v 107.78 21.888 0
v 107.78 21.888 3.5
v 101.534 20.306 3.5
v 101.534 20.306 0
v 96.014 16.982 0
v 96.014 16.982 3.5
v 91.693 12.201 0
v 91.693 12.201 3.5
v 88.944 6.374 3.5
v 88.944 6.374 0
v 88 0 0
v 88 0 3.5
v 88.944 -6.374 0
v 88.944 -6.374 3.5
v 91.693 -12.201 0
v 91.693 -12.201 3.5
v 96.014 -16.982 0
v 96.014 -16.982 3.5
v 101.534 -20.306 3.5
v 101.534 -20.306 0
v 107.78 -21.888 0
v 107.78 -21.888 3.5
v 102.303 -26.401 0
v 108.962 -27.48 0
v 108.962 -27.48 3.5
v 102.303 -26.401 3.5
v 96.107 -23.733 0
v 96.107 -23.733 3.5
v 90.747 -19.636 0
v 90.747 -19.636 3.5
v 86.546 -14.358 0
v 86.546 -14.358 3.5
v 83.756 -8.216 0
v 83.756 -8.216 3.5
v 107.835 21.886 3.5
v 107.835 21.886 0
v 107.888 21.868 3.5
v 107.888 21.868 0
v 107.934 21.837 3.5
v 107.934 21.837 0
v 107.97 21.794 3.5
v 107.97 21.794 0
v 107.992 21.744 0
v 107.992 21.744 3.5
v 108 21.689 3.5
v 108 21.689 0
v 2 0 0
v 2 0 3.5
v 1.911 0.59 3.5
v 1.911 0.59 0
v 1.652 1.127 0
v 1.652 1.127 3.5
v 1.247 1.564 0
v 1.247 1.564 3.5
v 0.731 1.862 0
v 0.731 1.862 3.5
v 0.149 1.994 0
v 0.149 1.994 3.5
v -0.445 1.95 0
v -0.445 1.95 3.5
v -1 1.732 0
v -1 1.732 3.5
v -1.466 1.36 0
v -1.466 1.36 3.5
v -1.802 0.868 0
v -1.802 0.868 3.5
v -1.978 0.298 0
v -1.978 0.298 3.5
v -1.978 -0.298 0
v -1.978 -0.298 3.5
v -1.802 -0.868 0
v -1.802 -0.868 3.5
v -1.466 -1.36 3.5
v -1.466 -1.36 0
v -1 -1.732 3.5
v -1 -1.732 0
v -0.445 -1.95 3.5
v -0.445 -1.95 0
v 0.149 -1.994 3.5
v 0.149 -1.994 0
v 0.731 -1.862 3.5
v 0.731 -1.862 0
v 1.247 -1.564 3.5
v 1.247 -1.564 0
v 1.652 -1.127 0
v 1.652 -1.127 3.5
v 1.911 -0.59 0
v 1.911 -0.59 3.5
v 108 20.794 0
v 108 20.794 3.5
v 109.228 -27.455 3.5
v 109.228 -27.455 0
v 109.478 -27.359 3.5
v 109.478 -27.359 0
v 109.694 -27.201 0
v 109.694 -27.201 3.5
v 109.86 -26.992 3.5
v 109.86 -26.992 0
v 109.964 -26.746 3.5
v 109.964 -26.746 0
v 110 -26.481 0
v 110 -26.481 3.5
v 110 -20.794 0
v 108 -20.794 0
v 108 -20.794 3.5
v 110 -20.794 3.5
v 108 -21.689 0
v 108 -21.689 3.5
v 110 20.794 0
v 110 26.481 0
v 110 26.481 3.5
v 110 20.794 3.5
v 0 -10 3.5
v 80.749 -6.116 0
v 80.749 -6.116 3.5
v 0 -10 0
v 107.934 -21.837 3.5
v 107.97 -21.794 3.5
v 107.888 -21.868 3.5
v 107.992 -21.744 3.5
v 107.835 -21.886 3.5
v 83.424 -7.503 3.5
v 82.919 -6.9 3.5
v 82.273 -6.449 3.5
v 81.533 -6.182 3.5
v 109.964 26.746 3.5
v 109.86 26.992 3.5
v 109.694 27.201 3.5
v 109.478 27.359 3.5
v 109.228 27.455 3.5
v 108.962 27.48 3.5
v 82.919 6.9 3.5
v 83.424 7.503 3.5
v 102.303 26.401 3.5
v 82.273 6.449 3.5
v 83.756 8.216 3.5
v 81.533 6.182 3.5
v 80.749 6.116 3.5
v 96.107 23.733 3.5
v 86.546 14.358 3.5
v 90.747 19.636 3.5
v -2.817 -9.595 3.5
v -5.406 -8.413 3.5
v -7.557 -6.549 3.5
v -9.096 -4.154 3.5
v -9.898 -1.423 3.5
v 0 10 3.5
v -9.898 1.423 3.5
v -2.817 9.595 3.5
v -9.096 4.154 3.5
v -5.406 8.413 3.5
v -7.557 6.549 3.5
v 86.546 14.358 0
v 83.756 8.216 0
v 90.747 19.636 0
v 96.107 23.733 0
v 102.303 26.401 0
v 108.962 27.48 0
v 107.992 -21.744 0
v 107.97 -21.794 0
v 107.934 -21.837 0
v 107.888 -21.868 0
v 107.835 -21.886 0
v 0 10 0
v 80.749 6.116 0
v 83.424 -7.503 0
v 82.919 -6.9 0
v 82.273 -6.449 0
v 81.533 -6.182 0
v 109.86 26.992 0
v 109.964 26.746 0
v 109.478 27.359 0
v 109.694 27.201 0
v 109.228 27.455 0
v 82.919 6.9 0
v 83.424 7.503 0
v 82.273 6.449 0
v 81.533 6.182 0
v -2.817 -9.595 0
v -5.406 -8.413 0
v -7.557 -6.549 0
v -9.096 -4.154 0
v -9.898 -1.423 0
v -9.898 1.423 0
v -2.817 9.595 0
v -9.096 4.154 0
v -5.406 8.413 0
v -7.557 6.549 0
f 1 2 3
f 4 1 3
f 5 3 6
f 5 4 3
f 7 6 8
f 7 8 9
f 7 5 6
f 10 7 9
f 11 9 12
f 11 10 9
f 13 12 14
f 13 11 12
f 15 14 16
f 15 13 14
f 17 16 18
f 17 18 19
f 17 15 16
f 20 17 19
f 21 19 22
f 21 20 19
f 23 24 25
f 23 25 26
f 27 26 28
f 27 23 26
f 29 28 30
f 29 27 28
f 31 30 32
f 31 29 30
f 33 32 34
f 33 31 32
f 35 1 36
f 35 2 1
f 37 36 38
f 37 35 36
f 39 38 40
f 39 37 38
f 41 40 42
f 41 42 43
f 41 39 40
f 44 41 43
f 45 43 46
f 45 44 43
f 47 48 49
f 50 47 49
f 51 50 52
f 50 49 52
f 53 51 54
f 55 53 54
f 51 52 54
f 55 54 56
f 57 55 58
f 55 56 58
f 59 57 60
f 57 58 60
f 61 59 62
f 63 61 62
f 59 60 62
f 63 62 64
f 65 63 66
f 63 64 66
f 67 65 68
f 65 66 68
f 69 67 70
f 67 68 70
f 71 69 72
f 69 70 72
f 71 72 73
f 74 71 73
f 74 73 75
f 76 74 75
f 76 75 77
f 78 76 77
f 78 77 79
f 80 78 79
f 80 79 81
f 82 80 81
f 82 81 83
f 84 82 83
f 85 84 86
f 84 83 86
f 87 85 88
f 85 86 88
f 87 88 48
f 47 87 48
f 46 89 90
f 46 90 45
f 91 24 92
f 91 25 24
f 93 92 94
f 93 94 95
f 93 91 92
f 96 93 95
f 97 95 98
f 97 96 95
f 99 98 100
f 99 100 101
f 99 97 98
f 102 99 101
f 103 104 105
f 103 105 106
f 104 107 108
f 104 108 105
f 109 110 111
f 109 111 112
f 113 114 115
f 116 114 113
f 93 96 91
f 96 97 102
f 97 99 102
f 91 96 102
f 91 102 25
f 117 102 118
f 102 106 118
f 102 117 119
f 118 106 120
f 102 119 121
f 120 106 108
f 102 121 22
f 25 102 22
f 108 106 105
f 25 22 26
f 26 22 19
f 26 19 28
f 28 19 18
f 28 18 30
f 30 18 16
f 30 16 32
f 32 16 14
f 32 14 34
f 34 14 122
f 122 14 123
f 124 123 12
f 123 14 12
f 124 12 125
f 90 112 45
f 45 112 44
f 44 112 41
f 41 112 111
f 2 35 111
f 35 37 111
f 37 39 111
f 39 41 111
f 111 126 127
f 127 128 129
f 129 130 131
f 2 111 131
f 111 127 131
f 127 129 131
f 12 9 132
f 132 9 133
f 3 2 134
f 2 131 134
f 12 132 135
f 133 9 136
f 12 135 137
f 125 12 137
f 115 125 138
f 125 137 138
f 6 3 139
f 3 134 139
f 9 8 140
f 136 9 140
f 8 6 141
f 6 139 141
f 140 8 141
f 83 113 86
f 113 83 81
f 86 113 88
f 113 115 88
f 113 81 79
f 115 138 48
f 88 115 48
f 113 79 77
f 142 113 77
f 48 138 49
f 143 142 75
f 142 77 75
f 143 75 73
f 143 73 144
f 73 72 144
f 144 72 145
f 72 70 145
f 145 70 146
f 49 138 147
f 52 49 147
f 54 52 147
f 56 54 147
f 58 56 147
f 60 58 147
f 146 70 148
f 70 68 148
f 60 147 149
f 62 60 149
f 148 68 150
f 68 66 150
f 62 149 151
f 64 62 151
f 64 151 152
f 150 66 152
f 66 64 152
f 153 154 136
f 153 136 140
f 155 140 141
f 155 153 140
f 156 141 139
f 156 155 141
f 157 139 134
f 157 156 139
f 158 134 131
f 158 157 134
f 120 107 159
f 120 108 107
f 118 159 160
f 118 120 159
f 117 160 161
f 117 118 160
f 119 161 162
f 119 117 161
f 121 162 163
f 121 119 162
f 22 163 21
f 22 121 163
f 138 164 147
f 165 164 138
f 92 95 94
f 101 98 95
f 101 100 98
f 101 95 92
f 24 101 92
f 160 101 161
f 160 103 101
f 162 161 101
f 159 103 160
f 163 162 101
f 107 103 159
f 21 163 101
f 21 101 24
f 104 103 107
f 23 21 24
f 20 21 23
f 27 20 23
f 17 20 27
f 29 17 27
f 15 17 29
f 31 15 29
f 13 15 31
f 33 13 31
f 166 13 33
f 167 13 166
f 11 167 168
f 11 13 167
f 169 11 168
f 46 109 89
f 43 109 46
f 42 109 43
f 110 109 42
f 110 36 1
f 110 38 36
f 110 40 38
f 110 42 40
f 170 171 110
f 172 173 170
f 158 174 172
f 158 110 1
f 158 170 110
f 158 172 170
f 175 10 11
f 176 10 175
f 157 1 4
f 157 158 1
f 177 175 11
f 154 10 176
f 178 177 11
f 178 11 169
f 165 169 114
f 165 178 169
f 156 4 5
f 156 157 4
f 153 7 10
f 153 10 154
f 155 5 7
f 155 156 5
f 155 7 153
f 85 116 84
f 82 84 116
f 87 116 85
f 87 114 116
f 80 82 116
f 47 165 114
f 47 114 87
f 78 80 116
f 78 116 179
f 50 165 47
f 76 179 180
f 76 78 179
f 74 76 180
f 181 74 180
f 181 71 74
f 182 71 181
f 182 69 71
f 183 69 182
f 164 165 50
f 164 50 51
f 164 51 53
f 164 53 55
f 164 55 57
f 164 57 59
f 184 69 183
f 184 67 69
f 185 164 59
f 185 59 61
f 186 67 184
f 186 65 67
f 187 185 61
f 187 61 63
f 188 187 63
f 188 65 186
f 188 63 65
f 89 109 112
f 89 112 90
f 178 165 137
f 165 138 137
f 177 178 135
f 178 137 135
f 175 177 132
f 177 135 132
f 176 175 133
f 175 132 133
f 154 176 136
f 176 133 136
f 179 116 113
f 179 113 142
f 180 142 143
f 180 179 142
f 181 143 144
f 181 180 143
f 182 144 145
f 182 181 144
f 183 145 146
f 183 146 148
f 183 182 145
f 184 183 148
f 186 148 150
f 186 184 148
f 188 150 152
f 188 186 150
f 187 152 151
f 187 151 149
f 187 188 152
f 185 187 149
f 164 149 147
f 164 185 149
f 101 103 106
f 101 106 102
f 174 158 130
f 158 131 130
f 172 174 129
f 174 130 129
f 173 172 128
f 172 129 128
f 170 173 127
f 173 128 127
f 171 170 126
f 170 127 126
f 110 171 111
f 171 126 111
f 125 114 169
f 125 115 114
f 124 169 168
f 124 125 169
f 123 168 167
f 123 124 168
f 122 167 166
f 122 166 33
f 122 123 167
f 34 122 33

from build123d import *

# Parameters (mm, degrees)
EXTRUSION1_DEPTH = 3.5
CONG_1_R         = 3
CONG_2_R         = 3
CONG_3_R         = 1
CONG_4_R         = 1
CONG_7_R         = 0.2
CONG_8_R         = 0.2
ESQUISSE2_R      = 2
EXTRUSION2_DEPTH = 3.5


with BuildPart() as part:
    # Esquisse1 → Extrusion1 (new body)
    with BuildSketch(Plane.XY):
        with BuildLine():
            Line((0, 10), (83.162526199, 6))
            ThreePointArc((83.162526199, 6), (92.806251136, 21.462176031), (110, 27.5))
            Line((110, 27.5), (110, 20.794494718))
            Line((110, 20.794494718), (108, 20.794494718))
            Line((108, 20.794494718), (108, 21.9089023))
            ThreePointArc((108, 21.9089023), (88, 0), (108, -21.9089023))
            Line((108, -21.9089023), (108, -20.794494718))
            Line((108, -20.794494718), (110, -20.794494718))
            Line((110, -20.794494718), (110, -27.5))
            ThreePointArc((110, -27.5), (92.806251136, -21.462176031), (83.162526199, -6))
            Line((83.162526199, -6), (0, -10))
            ThreePointArc((0, -10), (-10, 0), (0, 10))
        make_face()
    extrude(amount=EXTRUSION1_DEPTH)

    # Congé1
    cong_1_edges = [part.edges().sort_by_distance(p)[0] for p in [
        (83.162526199, 6, 1.75),
    ]]
    fillet(cong_1_edges, radius=CONG_1_R)

    # Congé2
    cong_2_edges = [part.edges().sort_by_distance(p)[0] for p in [
        (83.162526199, -6, 1.75),
    ]]
    fillet(cong_2_edges, radius=CONG_2_R)

    # Congé3
    cong_3_edges = [part.edges().sort_by_distance(p)[0] for p in [
        (110, 27.5, 1.75),
    ]]
    fillet(cong_3_edges, radius=CONG_3_R)

    # Congé4
    cong_4_edges = [part.edges().sort_by_distance(p)[0] for p in [
        (110, -27.5, 1.75),
    ]]
    fillet(cong_4_edges, radius=CONG_4_R)

    # Congé7
    cong_7_edges = [part.edges().sort_by_distance(p)[0] for p in [
        (108, -21.9089023, 1.75),
    ]]
    fillet(cong_7_edges, radius=CONG_7_R)

    # Congé8
    cong_8_edges = [part.edges().sort_by_distance(p)[0] for p in [
        (108, 21.9089023, 1.75),
    ]]
    fillet(cong_8_edges, radius=CONG_8_R)

    # Esquisse2 → Extrusion2 (cut)
    with BuildSketch(Plane.XY.offset(3.5)):
        Circle(ESQUISSE2_R)
    extrude(amount=-EXTRUSION2_DEPTH, mode=Mode.SUBTRACT)


solid = part.part
